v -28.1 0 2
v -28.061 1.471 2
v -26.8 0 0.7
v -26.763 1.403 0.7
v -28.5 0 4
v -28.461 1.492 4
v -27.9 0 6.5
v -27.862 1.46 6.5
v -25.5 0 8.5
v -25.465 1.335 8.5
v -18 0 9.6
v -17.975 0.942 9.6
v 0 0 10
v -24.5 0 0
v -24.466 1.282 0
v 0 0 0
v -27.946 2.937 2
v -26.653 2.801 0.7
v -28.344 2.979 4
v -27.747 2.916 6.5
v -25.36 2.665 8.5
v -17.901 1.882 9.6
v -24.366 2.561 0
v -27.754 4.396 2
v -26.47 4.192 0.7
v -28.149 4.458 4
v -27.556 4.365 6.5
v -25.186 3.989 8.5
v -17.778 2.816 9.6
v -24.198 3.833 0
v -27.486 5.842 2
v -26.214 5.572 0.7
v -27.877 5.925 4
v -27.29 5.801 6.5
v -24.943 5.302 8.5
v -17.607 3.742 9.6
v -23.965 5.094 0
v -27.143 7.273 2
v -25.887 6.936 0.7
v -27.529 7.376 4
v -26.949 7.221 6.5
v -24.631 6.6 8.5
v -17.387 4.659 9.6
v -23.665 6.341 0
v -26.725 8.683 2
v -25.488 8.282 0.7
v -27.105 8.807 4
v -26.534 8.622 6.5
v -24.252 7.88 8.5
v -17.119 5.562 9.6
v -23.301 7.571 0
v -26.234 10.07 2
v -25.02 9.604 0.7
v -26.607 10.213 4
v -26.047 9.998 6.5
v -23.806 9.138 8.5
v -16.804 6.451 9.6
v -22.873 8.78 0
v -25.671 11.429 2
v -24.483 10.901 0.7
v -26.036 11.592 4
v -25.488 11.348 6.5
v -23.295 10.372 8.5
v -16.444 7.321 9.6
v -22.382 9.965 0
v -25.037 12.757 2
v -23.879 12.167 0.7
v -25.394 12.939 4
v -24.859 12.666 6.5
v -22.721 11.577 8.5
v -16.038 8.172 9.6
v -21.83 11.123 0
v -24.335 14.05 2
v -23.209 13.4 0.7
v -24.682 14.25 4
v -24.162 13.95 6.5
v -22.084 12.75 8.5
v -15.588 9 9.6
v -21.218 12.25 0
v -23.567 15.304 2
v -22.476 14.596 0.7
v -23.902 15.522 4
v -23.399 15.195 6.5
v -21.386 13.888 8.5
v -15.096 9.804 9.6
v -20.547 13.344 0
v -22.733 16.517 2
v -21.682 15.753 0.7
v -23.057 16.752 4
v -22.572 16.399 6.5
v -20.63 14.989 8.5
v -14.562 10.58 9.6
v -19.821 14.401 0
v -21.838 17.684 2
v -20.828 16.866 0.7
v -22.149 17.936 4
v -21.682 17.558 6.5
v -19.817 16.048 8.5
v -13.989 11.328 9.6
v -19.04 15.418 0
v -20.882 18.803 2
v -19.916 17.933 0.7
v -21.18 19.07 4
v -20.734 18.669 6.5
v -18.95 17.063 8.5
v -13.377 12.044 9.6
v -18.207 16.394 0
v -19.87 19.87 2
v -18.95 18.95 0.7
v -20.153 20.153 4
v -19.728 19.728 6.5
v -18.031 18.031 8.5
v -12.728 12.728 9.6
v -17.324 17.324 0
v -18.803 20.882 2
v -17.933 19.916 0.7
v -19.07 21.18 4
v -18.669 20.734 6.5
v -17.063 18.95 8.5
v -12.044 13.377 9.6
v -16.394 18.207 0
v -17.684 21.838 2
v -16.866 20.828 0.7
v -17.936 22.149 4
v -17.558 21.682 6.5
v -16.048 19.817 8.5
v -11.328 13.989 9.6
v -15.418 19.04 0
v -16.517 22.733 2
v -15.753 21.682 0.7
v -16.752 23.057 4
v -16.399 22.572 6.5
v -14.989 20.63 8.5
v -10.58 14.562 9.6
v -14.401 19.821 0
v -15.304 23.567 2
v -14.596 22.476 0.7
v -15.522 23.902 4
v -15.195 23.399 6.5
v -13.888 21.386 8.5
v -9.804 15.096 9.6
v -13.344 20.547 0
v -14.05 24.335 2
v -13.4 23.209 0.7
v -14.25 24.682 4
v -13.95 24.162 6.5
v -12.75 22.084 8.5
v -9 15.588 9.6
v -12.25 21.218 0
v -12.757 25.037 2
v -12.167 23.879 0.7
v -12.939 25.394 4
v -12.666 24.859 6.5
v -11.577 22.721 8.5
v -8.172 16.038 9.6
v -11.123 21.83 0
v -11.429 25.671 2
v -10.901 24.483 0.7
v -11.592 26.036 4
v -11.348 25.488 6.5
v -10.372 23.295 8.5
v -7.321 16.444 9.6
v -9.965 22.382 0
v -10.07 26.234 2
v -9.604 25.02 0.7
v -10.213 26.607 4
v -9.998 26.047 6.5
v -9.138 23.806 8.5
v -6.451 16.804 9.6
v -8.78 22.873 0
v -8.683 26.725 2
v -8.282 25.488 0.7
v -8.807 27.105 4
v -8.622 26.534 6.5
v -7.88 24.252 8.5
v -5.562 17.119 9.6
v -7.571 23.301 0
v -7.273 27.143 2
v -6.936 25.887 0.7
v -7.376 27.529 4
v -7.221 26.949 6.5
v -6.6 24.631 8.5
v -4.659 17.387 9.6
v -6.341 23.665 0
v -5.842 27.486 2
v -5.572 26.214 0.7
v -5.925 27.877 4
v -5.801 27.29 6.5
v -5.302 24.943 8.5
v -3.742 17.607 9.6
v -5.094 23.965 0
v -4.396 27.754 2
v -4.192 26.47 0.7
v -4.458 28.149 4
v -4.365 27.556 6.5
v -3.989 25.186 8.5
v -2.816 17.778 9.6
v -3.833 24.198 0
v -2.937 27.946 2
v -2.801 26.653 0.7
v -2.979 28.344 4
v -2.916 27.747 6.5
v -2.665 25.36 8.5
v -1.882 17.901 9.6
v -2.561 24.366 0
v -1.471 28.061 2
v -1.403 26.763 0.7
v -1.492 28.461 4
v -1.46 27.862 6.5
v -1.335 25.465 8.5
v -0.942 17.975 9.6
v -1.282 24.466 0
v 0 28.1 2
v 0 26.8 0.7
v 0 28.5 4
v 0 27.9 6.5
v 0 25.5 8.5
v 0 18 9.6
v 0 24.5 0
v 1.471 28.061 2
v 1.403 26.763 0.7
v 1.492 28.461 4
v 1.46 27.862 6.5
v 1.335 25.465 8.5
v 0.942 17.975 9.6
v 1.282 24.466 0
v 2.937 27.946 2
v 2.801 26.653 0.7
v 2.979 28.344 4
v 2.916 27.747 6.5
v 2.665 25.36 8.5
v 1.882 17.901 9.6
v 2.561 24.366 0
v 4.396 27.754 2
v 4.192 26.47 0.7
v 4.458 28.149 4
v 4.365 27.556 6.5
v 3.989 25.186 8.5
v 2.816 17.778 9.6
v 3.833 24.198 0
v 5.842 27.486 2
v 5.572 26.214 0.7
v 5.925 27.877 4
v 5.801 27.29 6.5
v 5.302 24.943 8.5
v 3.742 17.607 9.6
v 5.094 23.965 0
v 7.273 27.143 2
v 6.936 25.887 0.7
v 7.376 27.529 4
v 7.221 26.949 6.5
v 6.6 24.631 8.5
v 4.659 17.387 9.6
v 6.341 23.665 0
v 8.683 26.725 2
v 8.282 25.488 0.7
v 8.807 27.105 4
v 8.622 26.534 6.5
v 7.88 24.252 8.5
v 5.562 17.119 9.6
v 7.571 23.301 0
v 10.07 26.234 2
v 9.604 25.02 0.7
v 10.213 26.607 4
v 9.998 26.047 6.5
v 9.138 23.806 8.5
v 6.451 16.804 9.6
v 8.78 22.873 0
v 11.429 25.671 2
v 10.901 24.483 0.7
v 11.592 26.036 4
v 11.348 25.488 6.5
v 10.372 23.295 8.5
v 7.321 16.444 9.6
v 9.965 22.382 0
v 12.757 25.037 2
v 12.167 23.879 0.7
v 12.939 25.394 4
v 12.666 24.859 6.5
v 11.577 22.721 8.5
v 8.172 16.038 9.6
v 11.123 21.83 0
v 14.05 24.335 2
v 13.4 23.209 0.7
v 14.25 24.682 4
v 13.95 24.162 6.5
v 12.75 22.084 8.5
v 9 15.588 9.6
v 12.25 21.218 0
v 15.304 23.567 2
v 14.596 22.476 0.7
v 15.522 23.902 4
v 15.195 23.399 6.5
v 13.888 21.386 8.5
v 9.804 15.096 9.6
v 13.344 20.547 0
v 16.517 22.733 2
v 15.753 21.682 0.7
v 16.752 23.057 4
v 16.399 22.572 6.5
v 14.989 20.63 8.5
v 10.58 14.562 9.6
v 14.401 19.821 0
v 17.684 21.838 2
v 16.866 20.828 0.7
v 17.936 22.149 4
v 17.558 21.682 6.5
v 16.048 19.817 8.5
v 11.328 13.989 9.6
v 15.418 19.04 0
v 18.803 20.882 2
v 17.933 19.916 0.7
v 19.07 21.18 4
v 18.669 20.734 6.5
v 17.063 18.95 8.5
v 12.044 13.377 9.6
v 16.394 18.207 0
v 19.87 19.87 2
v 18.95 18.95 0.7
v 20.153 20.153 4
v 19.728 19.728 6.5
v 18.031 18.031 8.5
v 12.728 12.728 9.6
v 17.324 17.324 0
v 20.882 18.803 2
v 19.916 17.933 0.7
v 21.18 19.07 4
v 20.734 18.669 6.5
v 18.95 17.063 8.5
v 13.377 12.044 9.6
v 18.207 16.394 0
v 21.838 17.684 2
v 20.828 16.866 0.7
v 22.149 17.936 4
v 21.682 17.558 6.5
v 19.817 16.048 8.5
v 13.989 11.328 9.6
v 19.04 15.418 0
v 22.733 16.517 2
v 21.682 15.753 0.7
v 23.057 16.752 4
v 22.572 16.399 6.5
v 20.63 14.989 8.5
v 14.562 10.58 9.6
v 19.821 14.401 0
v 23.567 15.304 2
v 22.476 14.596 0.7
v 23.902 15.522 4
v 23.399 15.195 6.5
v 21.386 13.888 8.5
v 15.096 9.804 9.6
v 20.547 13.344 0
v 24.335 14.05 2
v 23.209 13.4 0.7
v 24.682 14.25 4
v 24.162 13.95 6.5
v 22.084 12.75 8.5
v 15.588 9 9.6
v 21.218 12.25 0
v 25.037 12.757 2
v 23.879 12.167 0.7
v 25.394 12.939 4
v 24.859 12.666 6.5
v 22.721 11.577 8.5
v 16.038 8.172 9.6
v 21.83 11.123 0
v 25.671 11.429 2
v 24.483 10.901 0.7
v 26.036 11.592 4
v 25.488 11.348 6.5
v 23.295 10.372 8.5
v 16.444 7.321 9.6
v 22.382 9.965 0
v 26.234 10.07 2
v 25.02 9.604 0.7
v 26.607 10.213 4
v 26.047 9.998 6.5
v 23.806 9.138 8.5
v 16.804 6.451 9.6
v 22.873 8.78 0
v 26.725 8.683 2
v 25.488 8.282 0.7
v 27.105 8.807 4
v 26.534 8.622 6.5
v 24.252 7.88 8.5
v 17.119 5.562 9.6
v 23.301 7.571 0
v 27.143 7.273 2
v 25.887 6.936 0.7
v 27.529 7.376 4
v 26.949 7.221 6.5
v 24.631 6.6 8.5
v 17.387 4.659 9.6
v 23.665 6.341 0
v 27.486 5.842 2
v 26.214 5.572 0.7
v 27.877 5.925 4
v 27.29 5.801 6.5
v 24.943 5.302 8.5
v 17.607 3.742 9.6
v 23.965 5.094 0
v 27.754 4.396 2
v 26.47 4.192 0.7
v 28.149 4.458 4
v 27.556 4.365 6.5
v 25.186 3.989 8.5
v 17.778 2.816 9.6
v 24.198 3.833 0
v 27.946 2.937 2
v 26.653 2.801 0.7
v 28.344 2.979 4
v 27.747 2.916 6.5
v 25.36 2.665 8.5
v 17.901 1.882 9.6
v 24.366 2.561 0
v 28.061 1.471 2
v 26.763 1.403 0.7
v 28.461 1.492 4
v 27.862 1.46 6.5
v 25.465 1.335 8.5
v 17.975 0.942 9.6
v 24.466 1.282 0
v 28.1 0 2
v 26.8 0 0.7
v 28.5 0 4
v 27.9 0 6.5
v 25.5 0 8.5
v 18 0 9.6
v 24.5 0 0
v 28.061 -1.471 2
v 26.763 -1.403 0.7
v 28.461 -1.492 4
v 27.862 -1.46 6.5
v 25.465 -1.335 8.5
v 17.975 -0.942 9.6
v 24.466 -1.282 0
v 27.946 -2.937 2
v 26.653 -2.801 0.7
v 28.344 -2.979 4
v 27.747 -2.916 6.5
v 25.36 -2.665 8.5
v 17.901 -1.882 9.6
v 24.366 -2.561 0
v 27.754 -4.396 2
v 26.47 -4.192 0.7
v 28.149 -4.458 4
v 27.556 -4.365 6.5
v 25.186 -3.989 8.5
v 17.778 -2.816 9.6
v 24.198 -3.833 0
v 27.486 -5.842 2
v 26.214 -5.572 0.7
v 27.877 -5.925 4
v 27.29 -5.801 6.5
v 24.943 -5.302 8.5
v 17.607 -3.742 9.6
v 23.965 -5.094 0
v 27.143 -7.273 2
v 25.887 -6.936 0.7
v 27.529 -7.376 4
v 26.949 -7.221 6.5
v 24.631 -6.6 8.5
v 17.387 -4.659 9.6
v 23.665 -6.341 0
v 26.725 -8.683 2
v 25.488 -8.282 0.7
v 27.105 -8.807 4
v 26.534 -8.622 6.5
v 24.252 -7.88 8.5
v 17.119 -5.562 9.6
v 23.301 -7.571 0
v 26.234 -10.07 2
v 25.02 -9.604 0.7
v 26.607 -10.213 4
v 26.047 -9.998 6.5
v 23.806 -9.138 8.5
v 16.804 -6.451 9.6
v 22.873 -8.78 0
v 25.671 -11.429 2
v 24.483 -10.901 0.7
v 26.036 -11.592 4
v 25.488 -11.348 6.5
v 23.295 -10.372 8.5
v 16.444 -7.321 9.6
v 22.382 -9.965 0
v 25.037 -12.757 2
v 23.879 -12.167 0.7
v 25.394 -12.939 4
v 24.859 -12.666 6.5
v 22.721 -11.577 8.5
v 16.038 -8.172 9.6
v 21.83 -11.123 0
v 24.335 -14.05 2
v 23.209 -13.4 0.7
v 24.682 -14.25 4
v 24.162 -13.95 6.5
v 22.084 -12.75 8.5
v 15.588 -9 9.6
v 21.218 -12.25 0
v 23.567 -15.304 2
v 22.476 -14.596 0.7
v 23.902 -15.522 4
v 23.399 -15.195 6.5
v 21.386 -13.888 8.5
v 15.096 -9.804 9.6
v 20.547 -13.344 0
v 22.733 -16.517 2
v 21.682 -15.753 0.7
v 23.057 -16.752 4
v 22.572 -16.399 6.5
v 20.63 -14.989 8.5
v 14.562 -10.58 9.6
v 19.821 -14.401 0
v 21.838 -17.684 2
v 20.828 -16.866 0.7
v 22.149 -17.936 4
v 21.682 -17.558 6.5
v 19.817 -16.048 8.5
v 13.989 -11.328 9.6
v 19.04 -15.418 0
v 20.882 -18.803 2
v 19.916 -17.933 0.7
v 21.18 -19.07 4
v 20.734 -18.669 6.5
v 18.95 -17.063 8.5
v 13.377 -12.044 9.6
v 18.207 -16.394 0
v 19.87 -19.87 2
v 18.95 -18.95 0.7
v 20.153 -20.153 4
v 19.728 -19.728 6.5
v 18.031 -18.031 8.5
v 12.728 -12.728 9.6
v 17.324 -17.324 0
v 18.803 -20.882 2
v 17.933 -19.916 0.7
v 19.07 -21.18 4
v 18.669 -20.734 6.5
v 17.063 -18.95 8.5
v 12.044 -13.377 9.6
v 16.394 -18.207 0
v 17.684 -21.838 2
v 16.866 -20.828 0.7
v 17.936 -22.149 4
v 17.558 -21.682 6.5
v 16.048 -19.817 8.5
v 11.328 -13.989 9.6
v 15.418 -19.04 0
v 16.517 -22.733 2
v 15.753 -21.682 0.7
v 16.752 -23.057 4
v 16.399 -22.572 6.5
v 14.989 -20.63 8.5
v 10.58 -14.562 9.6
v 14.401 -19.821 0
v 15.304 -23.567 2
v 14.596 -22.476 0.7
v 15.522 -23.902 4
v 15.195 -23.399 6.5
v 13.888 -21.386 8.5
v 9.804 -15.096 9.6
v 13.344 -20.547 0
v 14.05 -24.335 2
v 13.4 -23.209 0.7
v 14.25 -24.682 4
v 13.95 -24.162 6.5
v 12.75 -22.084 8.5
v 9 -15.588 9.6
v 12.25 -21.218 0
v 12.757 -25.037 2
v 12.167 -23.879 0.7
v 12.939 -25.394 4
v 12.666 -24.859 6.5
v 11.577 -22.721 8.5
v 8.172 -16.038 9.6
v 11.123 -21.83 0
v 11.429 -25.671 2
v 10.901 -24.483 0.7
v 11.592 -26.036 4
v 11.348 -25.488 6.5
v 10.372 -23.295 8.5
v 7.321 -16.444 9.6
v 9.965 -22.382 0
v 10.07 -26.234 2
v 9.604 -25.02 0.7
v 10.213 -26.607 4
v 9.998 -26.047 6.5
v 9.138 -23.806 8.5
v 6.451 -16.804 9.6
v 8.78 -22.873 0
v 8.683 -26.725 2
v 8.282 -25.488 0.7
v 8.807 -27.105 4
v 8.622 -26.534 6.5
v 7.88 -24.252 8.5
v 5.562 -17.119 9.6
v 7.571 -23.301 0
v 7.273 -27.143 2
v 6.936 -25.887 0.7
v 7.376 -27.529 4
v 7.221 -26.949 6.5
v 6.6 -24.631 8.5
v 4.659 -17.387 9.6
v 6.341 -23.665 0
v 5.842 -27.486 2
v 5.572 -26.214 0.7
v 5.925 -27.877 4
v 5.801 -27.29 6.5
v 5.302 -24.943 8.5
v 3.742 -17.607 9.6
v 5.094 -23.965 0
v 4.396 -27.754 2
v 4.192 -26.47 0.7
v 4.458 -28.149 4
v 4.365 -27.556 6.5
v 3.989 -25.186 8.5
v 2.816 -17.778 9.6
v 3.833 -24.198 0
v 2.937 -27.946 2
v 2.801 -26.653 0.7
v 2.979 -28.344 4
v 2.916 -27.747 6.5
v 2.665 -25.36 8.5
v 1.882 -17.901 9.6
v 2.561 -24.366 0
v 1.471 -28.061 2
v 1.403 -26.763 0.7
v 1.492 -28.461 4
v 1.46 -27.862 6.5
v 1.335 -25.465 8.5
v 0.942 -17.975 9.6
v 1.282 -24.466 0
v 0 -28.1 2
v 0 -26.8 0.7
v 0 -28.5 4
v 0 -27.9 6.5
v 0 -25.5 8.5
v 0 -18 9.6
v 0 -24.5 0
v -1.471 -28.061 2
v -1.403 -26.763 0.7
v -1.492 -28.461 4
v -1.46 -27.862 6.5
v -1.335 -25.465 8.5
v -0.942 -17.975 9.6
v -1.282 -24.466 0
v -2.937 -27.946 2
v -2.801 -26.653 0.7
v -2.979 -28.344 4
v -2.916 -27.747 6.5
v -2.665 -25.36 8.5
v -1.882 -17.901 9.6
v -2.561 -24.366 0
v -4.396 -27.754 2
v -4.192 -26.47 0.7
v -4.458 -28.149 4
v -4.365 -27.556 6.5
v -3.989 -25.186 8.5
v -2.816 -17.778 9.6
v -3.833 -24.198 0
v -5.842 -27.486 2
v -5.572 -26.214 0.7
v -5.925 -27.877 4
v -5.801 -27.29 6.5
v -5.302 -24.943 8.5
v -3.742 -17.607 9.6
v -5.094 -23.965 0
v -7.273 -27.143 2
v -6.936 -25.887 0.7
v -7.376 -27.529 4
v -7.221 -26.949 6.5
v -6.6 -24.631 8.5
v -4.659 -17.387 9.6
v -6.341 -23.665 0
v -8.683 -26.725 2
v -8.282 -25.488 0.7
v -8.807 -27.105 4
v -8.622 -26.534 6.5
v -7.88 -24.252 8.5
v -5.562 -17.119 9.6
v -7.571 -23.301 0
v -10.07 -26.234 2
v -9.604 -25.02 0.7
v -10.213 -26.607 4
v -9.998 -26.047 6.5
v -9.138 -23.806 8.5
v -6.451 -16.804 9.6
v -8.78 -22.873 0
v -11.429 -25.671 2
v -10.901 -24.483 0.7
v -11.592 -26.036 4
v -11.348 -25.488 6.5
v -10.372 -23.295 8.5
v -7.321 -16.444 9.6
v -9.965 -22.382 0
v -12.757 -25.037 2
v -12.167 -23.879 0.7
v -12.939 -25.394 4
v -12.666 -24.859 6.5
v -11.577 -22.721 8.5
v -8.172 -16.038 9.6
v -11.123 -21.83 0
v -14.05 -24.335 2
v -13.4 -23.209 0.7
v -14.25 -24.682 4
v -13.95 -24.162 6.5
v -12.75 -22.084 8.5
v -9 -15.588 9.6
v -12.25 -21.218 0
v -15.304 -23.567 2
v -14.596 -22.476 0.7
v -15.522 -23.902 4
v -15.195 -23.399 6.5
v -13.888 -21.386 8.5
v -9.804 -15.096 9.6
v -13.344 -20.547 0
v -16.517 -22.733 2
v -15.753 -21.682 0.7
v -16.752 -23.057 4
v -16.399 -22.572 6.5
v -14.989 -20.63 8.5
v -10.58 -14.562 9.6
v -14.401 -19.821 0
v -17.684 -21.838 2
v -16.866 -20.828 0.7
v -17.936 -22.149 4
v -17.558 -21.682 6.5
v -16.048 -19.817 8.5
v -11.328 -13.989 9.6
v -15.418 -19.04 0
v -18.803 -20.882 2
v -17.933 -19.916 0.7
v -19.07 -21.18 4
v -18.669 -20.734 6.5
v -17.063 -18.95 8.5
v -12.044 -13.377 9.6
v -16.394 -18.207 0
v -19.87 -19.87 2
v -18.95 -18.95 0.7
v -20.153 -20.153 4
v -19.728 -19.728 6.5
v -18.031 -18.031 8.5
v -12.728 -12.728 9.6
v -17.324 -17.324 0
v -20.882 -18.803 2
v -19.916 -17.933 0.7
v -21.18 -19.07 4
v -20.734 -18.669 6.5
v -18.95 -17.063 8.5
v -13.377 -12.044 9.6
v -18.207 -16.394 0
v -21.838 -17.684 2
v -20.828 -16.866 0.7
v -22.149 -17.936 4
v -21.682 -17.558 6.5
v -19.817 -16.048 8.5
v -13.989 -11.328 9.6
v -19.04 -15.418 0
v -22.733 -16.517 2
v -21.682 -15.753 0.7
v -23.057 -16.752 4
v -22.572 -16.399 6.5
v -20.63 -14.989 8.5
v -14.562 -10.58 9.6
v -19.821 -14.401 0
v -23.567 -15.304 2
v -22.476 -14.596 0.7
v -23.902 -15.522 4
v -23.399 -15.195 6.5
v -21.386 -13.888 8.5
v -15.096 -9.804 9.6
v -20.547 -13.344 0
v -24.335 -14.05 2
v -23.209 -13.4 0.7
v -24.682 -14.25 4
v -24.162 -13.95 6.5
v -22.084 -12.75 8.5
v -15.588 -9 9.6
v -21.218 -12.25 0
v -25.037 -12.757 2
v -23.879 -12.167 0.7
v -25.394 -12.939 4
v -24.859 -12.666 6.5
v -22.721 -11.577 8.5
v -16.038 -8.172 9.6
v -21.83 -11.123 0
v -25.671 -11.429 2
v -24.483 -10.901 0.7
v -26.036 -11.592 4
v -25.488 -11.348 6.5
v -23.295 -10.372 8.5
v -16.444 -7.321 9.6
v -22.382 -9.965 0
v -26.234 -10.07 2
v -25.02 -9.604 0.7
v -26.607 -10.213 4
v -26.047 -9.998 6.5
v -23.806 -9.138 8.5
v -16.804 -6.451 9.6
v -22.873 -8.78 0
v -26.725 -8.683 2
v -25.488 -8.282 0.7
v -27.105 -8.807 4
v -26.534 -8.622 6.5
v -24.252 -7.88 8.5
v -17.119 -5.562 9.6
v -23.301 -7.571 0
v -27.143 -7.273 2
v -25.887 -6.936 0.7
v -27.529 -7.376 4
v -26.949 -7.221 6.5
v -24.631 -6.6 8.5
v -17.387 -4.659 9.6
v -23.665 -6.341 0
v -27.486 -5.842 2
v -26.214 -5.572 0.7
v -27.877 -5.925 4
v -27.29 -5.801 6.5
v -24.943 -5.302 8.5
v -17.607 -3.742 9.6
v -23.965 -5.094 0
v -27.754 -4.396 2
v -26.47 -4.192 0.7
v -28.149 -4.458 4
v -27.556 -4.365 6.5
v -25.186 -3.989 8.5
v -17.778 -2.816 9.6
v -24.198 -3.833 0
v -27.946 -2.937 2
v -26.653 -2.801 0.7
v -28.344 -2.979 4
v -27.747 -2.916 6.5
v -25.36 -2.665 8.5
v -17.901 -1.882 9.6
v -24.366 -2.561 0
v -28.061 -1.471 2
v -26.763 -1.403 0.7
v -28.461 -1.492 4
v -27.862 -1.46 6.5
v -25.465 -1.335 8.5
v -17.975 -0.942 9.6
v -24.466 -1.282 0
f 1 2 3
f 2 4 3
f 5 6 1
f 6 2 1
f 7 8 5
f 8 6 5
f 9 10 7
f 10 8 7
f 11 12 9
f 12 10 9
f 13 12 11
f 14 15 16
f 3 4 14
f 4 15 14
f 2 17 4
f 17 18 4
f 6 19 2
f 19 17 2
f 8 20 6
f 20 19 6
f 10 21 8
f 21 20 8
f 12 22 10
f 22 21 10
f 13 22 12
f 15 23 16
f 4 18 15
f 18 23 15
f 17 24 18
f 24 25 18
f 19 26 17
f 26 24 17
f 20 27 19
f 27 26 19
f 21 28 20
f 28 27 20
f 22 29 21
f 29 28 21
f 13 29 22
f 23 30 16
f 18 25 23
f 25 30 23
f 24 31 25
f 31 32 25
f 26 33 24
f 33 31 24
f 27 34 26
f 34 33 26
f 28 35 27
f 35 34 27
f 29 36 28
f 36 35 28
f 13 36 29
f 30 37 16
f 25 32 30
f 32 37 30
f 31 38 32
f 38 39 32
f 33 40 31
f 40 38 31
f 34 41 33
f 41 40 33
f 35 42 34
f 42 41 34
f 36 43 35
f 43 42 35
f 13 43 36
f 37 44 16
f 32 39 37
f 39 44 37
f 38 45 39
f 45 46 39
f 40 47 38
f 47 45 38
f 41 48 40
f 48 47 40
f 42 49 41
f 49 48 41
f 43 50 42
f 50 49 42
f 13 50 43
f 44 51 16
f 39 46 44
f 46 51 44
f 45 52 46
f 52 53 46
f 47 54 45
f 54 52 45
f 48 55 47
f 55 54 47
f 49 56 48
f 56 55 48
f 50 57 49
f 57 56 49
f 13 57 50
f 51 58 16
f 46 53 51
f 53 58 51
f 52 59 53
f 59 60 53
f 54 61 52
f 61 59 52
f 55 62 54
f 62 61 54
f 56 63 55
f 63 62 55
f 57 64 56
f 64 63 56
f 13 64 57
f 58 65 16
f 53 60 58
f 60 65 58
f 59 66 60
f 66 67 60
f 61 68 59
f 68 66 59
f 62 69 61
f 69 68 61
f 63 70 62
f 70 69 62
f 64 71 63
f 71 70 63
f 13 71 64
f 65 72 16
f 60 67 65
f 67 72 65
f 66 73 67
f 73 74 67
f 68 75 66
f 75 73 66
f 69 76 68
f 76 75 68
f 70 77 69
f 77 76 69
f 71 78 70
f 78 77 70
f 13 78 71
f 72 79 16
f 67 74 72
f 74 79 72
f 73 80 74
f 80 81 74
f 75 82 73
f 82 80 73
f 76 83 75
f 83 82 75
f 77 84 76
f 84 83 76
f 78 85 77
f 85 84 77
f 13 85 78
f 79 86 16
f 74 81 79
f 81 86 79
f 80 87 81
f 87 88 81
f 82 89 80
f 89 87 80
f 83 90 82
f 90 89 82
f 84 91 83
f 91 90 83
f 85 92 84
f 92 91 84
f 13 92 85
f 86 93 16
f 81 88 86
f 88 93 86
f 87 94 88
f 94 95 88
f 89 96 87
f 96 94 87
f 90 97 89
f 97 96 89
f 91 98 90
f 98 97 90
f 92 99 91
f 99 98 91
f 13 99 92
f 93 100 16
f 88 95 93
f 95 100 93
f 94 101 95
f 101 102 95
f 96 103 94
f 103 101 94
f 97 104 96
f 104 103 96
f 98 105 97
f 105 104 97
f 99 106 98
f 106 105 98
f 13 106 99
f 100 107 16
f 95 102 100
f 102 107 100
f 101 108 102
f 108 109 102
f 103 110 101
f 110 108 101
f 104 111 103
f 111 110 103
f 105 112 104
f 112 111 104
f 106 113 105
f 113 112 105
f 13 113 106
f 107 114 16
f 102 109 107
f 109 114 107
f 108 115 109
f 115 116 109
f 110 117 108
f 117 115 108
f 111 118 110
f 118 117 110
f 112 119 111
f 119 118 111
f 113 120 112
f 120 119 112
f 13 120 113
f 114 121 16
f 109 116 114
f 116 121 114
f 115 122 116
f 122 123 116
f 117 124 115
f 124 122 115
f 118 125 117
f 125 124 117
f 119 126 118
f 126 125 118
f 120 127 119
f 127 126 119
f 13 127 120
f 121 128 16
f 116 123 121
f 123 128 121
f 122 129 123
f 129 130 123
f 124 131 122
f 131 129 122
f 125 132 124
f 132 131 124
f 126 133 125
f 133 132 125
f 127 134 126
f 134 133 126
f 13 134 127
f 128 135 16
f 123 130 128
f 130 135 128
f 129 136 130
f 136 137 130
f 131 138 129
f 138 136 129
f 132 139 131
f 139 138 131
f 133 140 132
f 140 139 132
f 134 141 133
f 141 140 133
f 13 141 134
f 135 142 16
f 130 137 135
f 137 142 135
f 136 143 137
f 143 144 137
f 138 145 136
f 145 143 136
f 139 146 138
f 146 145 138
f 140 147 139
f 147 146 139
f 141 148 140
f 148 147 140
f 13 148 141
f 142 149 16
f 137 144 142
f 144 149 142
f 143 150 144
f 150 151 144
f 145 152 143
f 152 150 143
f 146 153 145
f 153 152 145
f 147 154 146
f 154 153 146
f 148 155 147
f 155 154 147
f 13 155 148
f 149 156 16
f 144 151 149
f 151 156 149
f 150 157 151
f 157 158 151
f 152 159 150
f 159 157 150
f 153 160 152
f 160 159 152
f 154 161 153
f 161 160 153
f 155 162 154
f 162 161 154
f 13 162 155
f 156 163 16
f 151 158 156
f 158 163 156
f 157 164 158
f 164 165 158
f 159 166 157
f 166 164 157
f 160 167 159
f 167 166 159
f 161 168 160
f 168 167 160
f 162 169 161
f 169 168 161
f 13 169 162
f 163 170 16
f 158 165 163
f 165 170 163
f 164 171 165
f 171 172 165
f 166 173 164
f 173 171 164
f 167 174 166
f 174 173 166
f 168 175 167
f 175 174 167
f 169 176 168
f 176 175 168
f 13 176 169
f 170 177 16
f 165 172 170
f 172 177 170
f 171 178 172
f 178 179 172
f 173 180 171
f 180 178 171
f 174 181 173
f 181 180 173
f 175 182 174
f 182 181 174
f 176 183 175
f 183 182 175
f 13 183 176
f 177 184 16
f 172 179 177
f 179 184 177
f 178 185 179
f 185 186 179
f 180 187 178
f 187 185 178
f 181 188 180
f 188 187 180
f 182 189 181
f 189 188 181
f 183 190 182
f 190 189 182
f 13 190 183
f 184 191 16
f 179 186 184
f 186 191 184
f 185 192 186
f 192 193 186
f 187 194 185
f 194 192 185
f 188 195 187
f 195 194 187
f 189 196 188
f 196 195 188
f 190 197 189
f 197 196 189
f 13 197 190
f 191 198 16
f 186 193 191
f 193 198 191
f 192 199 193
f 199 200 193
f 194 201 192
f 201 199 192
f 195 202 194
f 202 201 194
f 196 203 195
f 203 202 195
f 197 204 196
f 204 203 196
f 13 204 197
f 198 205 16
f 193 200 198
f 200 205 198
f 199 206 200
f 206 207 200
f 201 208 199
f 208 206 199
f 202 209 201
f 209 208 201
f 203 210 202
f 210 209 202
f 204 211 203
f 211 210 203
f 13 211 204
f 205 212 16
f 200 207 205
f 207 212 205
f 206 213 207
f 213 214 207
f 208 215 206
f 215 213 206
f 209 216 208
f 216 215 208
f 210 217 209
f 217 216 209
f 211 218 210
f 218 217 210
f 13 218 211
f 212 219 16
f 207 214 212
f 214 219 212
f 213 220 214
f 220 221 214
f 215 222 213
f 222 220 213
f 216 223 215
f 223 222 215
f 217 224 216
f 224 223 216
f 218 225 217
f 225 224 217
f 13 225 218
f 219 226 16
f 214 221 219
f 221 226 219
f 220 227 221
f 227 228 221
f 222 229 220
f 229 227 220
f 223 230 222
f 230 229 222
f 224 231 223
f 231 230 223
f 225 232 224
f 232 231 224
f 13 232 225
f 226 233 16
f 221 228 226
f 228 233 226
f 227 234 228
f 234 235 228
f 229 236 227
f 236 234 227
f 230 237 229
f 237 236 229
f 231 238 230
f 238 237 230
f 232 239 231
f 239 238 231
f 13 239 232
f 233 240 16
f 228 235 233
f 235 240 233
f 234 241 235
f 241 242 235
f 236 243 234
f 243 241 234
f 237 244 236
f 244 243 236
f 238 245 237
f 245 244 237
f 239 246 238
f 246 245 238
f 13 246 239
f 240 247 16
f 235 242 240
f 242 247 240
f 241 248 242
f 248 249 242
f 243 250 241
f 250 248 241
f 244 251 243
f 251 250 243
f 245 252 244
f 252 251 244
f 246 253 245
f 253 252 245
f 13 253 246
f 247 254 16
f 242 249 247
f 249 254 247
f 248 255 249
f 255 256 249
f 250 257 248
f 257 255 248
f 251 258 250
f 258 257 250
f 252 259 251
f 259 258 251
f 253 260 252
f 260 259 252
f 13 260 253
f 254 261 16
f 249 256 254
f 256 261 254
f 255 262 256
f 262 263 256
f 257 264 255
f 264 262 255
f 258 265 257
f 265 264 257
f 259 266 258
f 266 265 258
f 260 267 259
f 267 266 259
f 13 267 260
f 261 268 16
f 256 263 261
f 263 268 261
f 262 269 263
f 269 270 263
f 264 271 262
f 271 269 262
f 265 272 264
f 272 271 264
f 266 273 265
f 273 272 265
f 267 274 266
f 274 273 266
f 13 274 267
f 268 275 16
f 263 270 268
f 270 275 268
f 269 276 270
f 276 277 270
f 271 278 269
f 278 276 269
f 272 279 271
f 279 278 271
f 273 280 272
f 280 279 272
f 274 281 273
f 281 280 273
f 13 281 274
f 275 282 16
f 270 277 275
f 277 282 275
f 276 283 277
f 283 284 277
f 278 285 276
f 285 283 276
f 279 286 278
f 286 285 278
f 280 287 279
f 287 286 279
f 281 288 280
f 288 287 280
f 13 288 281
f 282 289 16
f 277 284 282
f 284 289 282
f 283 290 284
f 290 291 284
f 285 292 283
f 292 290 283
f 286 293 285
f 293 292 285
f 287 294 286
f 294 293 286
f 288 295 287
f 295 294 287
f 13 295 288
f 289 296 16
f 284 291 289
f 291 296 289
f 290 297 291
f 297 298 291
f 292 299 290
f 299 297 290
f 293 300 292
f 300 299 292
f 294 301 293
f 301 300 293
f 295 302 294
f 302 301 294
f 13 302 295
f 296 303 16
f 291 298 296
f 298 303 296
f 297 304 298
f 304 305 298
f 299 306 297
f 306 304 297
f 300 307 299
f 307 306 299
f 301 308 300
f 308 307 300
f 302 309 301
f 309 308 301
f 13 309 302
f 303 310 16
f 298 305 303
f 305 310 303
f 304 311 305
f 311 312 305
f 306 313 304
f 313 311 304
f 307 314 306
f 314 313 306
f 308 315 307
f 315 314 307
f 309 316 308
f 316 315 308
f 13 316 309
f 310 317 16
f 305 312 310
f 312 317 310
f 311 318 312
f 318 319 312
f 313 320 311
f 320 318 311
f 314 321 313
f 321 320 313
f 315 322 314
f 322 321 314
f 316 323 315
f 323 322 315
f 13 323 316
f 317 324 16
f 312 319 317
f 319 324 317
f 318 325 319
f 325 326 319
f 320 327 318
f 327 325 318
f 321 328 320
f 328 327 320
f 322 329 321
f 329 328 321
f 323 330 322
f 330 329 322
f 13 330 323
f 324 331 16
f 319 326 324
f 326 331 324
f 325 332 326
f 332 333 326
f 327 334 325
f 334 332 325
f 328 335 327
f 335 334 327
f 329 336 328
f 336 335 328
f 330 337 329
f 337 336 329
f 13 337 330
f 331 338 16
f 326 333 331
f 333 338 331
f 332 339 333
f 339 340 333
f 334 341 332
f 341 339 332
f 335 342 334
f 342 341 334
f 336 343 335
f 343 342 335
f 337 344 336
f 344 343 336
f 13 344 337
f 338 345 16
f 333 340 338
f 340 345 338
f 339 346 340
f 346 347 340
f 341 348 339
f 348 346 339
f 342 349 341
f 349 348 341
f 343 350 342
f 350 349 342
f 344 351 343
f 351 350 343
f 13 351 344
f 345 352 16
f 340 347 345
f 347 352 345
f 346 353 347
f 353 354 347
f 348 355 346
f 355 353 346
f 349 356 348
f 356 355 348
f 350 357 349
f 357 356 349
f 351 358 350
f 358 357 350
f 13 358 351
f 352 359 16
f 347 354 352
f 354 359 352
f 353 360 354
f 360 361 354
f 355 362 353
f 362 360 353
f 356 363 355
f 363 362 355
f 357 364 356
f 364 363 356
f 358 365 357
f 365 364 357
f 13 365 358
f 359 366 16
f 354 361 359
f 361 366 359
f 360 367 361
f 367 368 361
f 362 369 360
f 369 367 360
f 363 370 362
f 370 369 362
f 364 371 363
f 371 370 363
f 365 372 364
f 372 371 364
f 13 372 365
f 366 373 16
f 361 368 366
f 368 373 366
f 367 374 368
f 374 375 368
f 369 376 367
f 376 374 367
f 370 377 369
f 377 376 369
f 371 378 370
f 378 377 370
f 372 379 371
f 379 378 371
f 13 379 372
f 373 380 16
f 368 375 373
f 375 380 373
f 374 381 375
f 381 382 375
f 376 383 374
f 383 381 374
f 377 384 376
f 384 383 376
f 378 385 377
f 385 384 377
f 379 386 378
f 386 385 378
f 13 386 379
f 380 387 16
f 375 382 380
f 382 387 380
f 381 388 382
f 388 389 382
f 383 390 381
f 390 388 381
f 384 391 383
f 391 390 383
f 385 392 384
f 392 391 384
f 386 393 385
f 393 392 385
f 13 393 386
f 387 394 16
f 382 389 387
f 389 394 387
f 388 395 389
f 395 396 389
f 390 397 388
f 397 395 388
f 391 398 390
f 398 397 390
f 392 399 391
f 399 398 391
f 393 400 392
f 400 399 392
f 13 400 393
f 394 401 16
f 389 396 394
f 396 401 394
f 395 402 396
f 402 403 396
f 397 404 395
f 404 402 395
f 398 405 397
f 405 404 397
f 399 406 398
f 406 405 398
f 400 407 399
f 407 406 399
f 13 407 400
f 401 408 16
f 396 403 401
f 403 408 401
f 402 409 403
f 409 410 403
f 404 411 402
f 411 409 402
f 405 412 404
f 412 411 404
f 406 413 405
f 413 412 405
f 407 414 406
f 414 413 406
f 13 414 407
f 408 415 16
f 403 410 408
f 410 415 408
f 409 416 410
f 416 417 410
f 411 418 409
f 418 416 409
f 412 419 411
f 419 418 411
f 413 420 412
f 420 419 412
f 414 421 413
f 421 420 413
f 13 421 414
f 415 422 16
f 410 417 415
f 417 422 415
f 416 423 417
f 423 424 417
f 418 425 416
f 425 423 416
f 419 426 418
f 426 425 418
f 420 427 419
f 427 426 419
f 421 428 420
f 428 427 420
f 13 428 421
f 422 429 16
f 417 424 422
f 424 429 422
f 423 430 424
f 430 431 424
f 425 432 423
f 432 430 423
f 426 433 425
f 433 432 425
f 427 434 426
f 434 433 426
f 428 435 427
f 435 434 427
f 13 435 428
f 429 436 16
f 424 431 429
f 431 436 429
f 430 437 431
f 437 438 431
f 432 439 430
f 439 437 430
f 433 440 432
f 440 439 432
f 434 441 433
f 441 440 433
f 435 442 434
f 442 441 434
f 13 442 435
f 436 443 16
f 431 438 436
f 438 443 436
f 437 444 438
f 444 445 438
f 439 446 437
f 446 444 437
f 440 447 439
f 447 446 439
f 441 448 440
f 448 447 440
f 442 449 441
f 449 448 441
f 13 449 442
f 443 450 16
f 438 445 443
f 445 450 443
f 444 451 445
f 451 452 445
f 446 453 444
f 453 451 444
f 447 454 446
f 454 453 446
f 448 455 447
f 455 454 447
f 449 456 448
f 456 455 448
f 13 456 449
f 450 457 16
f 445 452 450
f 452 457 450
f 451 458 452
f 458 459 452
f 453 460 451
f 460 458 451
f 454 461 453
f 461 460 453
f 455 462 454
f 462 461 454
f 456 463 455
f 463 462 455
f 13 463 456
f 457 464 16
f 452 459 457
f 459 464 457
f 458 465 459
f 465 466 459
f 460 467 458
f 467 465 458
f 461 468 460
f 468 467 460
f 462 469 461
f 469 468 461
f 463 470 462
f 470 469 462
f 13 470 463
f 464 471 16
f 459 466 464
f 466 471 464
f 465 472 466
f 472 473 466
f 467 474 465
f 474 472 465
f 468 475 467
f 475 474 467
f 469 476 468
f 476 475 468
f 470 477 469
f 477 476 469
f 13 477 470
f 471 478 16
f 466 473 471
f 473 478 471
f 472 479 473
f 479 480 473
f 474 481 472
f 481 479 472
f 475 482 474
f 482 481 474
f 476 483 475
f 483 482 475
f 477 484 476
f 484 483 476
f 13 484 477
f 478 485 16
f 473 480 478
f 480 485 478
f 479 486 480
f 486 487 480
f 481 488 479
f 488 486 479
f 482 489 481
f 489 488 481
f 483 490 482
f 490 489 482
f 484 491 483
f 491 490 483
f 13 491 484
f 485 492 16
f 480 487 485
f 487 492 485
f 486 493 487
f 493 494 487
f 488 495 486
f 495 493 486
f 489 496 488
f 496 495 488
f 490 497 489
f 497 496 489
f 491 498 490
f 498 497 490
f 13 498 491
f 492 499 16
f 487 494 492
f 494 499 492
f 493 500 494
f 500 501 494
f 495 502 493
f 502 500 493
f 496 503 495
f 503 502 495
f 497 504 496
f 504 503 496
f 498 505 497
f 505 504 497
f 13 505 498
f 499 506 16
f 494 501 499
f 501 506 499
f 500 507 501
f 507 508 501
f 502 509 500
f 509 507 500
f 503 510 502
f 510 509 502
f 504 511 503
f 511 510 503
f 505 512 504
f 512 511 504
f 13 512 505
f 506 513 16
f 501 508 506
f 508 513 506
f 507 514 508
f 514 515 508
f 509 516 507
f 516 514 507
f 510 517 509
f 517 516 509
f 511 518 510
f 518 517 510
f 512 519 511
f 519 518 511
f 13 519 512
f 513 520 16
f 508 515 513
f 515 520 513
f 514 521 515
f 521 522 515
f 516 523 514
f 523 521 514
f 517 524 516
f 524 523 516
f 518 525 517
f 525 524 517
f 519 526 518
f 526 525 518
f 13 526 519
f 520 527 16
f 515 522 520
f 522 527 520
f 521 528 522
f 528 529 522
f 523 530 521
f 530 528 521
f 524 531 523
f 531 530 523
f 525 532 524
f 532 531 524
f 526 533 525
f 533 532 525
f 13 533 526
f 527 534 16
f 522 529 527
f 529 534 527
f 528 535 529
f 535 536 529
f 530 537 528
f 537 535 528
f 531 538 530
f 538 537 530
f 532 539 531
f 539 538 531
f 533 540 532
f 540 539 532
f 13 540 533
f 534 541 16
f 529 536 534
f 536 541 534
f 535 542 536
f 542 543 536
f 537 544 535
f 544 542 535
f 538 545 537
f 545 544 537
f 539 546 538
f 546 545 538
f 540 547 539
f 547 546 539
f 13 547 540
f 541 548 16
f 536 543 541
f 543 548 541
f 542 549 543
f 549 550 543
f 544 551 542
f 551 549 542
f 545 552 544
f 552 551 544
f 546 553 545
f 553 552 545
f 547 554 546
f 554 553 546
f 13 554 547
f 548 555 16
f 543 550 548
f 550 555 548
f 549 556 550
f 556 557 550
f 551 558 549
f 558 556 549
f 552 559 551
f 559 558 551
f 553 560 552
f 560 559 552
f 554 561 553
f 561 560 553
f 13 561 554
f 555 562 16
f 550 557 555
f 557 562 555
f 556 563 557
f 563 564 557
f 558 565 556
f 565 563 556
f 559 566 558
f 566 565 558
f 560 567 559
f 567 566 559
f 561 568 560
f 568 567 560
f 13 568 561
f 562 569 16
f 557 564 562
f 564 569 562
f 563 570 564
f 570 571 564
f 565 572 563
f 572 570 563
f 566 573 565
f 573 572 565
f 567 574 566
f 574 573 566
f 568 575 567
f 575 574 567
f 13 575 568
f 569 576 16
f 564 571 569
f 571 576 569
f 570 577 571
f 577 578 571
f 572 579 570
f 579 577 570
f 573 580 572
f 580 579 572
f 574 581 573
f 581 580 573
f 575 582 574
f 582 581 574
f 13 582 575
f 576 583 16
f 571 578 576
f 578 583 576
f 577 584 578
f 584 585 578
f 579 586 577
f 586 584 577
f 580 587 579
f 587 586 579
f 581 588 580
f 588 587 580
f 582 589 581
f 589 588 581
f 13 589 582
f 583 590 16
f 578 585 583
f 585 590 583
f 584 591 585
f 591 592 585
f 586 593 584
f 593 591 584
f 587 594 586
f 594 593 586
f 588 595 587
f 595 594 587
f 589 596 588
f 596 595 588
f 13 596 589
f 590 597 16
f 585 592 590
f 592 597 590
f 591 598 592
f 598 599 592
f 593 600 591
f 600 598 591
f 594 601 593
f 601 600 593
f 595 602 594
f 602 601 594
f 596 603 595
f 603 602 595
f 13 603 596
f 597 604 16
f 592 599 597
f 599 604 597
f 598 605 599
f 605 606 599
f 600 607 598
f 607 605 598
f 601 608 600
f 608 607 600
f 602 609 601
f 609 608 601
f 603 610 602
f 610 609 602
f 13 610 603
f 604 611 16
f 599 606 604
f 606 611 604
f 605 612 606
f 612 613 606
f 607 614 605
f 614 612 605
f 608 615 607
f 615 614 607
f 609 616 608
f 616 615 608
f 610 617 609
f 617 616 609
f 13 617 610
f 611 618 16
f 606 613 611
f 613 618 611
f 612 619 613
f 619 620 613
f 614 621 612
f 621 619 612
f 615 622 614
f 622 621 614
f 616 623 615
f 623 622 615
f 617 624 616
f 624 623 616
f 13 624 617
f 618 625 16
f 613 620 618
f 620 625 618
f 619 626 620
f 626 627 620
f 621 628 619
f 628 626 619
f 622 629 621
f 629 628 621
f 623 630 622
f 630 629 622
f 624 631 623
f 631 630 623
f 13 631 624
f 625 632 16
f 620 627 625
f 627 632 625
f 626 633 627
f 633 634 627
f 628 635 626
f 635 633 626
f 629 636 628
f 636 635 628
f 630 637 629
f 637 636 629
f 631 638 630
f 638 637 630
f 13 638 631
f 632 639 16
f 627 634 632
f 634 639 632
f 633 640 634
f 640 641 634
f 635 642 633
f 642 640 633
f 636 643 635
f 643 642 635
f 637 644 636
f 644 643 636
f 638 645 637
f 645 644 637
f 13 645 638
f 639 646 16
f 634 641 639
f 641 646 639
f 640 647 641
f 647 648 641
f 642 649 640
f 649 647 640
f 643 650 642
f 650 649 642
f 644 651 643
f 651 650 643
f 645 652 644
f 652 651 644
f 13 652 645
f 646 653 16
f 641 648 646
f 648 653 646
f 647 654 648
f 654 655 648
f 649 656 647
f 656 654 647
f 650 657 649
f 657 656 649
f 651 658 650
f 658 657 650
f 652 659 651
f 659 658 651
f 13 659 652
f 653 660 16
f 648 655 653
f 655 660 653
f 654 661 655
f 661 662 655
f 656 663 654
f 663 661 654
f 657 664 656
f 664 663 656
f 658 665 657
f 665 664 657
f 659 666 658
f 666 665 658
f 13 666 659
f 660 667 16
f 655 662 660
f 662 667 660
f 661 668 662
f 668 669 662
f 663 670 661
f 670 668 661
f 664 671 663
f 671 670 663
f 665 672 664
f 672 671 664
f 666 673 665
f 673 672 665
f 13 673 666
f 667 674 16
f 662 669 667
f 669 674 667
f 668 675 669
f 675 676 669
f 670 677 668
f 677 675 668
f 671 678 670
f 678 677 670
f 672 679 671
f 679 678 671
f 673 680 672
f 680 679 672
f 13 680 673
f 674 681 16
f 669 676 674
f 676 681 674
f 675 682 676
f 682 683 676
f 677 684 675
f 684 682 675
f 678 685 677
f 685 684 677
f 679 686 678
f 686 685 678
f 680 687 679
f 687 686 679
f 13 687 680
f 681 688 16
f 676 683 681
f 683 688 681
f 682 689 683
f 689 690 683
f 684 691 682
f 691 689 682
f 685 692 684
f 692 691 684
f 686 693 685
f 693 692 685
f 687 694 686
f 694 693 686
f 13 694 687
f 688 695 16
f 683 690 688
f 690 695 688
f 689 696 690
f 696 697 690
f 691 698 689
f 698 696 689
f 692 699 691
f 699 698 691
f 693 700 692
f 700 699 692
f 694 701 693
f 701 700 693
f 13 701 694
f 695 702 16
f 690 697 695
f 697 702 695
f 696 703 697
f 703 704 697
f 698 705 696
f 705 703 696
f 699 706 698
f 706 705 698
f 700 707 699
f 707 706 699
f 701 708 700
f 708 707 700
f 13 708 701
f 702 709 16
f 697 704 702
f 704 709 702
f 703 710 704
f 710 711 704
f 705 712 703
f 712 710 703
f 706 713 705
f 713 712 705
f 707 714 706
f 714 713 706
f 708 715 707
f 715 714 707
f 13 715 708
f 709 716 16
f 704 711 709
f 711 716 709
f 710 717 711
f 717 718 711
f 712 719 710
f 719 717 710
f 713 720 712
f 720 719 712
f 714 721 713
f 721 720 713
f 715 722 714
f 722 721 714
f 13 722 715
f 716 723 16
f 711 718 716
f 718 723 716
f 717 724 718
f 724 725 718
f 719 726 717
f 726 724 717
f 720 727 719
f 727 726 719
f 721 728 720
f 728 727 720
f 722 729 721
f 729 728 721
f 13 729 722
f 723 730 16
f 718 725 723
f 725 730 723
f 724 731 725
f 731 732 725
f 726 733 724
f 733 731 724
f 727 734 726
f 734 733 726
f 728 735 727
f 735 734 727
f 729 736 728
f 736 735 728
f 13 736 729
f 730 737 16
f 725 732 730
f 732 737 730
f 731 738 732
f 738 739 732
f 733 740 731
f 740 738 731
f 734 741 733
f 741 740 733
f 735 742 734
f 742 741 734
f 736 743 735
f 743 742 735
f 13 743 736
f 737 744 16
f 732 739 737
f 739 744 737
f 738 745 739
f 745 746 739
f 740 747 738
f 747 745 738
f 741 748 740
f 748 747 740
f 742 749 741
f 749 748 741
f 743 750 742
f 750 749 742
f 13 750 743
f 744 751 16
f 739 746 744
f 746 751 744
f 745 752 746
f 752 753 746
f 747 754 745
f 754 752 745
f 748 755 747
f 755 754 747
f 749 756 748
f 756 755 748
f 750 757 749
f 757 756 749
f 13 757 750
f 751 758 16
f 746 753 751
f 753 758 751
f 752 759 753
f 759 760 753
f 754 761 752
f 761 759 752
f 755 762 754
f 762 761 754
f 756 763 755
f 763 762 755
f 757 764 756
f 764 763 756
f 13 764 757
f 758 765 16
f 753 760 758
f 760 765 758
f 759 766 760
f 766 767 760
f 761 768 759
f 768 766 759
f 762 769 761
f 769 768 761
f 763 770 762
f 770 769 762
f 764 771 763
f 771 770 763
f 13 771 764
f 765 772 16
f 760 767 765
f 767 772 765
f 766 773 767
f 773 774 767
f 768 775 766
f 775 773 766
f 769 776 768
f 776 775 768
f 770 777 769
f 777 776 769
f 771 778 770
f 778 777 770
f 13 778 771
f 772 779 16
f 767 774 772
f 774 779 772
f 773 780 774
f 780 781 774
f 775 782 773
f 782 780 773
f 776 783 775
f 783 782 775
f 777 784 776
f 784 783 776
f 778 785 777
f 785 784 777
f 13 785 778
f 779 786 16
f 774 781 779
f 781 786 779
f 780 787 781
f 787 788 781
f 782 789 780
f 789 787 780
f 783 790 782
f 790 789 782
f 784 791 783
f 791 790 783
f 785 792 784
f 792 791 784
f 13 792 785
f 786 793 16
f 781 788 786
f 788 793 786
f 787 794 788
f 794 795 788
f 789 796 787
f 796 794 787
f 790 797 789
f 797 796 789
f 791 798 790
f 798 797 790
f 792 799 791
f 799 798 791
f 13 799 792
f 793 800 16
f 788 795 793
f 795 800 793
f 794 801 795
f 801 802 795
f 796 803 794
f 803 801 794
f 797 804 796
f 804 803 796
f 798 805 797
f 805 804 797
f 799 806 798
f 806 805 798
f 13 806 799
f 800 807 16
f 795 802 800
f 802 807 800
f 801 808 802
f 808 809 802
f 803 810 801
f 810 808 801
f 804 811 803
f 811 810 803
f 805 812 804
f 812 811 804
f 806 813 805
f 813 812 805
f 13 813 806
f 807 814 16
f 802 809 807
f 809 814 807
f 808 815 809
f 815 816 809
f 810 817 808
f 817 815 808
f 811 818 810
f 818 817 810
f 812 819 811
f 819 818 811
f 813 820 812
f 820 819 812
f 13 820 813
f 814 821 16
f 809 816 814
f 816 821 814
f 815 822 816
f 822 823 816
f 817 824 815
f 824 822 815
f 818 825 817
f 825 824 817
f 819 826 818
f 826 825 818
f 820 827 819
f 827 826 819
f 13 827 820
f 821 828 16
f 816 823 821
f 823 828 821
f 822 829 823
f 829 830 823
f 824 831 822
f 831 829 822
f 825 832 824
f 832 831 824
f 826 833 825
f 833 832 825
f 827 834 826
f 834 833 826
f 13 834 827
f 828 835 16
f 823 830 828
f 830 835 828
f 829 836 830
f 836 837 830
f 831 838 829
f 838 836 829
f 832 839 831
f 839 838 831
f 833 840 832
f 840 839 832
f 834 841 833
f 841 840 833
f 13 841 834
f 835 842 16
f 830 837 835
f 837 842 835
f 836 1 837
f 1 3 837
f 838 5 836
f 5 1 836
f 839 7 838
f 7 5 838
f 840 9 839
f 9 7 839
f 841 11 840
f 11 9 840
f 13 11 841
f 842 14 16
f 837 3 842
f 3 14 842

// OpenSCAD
// Cookie replica for real trials: the same profile as the simulated cookie (task.py, COOKIE_PROFILE).
// 57 mm across, 10 mm thick, underside flat to a 49 mm circle, then rounded up to the rim.
// Print in PETG, flat side down on a smooth bed, 0.2 mm layers, 2 perimeters, 3 bottom and top layers, gyroid infill.
// Start at 35 % infill and adjust until each replica weighs 16 +/- 1 g on a kitchen scale (solid would be about 28 g).
// Volume: 22.1 cm3. Print six: four for the trial and two spares.

$fn = 120;
profile_mm = [[0, 0], [24.5, 0], [26.8, 0.7], [28.1, 2.0], [28.5, 4.0], [27.9, 6.5], [25.5, 8.5], [18.0, 9.6], [0, 10.0]];

rotate_extrude() polygon(profile_mm);
